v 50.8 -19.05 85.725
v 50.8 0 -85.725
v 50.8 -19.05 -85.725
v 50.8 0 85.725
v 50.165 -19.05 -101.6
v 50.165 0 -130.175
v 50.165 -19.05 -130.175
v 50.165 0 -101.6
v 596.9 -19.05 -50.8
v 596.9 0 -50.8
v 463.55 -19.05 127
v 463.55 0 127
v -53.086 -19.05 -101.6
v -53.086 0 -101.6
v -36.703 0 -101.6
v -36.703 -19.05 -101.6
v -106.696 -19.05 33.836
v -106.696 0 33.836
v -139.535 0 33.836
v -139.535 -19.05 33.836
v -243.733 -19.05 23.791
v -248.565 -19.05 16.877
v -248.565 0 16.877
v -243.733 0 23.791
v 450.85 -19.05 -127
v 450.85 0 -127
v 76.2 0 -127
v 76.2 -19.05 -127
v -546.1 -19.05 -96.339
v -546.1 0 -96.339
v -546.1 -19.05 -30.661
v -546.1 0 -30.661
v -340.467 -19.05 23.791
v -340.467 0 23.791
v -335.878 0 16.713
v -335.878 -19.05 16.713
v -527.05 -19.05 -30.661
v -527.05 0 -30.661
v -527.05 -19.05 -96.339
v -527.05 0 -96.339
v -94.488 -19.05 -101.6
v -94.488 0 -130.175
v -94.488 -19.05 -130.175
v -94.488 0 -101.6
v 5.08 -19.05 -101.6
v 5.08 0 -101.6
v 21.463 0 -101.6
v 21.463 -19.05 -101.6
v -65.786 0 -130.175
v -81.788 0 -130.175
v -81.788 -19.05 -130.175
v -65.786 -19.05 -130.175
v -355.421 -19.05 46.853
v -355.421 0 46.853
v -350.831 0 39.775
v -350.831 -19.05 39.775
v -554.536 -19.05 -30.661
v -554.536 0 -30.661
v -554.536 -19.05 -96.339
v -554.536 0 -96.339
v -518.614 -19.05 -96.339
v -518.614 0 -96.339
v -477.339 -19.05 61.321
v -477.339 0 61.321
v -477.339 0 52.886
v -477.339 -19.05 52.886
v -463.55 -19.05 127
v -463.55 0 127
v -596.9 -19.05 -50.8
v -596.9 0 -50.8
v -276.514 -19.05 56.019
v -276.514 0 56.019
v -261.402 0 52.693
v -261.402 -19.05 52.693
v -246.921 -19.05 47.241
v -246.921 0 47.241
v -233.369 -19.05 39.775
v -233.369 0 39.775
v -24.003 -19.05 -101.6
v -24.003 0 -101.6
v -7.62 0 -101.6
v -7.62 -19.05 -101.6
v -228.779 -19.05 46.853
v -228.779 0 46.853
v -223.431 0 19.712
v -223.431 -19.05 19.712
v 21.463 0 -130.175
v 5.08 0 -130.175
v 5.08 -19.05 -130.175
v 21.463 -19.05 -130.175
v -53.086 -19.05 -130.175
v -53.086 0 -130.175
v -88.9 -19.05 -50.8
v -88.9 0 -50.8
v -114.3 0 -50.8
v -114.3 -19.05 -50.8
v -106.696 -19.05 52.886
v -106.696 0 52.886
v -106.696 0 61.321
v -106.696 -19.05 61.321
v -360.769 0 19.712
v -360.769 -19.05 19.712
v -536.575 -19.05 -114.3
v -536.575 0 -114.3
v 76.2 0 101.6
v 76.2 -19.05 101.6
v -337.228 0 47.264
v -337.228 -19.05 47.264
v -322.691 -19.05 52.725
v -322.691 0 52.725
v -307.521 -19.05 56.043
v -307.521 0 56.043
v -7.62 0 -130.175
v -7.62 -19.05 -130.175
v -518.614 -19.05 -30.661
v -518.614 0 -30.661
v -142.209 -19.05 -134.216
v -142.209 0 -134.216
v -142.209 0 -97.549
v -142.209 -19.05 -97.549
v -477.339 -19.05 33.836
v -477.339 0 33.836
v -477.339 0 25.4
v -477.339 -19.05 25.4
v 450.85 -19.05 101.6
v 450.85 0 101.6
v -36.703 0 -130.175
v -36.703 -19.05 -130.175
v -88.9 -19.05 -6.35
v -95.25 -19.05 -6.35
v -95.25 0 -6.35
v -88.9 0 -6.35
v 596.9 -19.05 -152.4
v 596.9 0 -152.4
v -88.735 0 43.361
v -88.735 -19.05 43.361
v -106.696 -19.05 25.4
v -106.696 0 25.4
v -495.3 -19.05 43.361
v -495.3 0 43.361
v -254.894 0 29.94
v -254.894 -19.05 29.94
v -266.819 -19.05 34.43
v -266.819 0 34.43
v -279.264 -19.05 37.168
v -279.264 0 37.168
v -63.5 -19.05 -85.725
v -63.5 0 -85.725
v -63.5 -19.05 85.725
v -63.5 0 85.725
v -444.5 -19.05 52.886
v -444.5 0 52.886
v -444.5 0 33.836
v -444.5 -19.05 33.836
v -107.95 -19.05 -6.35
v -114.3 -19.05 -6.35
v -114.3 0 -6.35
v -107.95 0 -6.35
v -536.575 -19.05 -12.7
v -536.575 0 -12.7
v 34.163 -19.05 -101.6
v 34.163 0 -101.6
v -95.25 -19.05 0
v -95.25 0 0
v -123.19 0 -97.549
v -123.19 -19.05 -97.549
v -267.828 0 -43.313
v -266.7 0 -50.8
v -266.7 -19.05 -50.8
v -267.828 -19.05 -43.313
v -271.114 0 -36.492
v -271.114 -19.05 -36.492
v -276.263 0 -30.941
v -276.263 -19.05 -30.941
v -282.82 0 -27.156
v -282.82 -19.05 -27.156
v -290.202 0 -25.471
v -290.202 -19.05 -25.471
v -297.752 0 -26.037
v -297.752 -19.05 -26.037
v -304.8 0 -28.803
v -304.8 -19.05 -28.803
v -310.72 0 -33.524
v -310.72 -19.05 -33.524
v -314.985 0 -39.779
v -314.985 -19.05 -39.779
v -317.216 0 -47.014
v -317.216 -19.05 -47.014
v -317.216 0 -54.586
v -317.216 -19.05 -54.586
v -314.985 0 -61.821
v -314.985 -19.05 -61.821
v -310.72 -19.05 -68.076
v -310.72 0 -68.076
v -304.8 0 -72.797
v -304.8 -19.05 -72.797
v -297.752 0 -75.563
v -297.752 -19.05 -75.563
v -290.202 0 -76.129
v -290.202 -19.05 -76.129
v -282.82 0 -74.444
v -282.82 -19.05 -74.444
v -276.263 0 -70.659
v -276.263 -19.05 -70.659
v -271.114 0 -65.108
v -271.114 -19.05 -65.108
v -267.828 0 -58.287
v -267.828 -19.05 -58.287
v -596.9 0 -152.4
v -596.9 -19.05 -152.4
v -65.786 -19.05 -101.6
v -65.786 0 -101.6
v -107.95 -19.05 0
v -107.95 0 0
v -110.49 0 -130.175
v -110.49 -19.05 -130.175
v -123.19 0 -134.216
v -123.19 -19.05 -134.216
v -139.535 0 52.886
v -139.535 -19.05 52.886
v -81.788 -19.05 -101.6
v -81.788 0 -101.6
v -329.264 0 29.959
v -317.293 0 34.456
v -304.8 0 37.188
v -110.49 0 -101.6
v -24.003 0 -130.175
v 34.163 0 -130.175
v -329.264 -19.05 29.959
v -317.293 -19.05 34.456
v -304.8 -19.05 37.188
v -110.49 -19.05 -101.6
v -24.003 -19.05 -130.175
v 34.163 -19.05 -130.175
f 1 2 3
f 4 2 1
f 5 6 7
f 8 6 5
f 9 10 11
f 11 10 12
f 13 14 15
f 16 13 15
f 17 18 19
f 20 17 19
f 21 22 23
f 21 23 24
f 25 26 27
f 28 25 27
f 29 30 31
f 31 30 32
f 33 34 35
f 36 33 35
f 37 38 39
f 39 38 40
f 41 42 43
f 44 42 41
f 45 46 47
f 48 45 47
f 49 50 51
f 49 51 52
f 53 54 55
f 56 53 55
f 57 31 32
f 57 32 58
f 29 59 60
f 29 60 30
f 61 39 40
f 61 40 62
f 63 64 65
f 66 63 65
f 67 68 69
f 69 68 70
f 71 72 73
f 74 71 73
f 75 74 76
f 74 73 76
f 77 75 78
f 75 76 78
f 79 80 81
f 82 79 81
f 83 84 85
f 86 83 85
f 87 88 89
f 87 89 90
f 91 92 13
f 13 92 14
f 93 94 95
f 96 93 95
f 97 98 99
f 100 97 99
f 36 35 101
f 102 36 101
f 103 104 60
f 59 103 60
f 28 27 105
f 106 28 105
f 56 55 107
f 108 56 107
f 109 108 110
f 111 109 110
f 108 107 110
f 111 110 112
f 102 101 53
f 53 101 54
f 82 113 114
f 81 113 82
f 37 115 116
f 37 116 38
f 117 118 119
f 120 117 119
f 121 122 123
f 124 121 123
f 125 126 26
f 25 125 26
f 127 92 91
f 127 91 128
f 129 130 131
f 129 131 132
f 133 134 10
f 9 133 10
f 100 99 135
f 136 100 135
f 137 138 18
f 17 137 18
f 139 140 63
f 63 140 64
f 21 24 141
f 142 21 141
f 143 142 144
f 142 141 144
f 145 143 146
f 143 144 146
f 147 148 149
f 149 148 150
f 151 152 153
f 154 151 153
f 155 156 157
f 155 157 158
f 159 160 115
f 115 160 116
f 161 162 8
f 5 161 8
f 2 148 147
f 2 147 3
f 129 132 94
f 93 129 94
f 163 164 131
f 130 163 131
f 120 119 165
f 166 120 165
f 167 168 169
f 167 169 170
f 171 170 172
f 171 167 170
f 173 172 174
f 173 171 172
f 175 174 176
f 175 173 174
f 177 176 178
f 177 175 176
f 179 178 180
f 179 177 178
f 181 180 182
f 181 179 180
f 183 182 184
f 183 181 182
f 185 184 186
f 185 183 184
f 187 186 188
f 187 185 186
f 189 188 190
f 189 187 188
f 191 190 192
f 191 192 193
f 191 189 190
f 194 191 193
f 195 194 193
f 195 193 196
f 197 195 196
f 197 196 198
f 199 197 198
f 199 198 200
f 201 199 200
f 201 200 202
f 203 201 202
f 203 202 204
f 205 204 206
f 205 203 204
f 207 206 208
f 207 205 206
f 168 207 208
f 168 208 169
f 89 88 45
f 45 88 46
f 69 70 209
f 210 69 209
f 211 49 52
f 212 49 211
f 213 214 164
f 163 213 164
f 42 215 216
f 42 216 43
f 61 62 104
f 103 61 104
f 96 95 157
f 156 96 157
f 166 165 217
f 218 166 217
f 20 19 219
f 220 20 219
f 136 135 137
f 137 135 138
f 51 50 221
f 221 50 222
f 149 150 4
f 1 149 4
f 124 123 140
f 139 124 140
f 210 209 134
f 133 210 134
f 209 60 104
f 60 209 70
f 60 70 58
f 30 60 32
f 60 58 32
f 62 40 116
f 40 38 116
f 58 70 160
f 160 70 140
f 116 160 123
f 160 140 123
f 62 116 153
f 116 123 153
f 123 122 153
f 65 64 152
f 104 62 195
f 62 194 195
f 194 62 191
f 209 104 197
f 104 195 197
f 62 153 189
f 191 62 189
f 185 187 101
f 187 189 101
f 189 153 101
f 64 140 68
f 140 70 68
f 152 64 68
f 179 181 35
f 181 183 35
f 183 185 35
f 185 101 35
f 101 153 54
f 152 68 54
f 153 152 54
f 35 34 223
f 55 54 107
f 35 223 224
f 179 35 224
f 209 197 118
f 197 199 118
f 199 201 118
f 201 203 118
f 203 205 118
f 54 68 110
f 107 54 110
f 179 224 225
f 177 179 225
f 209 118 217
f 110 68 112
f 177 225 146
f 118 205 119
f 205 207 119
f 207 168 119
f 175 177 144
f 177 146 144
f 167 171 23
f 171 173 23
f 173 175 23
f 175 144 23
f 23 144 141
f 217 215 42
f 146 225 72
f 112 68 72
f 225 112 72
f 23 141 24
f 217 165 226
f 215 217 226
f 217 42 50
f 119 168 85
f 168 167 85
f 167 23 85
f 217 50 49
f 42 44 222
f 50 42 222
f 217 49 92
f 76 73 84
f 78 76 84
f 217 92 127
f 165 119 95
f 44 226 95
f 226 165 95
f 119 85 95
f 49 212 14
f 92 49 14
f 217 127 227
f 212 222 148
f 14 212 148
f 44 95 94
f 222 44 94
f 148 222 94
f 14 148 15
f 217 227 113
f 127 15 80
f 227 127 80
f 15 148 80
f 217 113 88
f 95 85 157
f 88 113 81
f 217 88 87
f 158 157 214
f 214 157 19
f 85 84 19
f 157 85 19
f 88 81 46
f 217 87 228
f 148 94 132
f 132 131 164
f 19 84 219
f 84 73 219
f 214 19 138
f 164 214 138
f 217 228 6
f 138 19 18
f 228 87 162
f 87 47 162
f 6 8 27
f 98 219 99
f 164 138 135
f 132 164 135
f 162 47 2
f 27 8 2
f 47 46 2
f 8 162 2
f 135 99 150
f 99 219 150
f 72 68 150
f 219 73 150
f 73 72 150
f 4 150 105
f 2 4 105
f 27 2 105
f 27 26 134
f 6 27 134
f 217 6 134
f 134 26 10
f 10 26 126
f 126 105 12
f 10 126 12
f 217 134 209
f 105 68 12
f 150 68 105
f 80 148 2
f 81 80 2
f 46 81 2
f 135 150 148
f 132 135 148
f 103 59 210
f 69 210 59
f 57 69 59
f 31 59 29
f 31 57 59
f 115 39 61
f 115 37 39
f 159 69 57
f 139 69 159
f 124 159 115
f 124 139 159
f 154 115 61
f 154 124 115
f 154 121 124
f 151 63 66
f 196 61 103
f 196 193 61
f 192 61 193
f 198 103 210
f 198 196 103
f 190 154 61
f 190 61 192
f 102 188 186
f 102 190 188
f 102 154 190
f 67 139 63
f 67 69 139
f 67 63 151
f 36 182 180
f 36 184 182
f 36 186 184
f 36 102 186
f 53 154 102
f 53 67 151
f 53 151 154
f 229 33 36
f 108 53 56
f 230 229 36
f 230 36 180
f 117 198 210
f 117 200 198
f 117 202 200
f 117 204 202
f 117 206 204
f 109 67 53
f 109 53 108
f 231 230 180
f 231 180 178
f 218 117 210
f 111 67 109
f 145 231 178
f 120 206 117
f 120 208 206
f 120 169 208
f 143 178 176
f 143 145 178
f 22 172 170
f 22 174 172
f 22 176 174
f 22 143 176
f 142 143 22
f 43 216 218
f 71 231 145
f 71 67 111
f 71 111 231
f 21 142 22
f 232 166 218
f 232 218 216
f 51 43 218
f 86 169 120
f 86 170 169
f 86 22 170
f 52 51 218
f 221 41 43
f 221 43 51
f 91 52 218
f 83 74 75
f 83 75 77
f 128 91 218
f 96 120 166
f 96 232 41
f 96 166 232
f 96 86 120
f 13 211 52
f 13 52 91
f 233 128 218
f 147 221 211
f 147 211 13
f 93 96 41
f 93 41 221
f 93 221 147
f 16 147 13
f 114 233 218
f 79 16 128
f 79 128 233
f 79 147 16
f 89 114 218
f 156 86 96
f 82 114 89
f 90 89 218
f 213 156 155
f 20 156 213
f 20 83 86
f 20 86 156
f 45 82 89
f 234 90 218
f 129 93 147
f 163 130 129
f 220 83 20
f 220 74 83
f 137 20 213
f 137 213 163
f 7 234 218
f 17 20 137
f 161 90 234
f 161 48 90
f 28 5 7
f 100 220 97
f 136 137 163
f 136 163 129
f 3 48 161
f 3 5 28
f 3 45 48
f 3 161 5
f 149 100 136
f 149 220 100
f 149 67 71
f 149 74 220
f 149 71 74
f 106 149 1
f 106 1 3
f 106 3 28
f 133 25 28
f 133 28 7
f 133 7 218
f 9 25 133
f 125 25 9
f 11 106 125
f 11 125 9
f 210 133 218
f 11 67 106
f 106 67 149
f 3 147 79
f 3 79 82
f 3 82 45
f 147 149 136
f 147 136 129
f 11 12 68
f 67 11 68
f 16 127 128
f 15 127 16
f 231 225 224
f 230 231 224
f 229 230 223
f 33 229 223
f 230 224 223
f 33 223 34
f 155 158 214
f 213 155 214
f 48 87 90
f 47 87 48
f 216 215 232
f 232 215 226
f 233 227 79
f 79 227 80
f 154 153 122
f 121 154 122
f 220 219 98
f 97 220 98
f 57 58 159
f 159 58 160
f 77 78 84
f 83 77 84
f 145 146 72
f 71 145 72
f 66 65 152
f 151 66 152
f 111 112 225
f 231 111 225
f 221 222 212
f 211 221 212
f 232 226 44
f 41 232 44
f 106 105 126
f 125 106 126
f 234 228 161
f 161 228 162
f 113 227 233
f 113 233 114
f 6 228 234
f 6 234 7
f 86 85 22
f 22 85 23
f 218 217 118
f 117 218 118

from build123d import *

# Parameters (mm, degrees)
F0_W     = 16.002
F0_H     = 28.575
F0_W_2   = 16.383
F0_R     = 25.4
F0_W_3   = 114.3
F0_H_2   = 171.45
F1_DEPTH = 19.05


with BuildPart() as f1:
    # F0 (on Front) → F1 (new body)
    with BuildSketch(Plane.XZ):
        Polygon((-596.9, -50.8), (-596.9, -127), (-596.9, -152.4), (596.9, -152.4), (596.9, -127), (596.9, -50.8), (463.55, 127), (-463.55, 127), align=None)
        Polygon((-123.19, -97.549498), (-123.19, -101.6), (-123.19, -115.8875), (-123.19, -130.175), (-123.19, -134.215891), (-142.208517, -134.215891), (-142.208517, -97.549498), align=None, mode=Mode.SUBTRACT)
        with Locations((-102.489, -115.8875)):
            Rectangle(F0_W, F0_H, mode=Mode.SUBTRACT)
        with Locations((-73.787, -115.8875)):
            Rectangle(F0_W, F0_H, mode=Mode.SUBTRACT)
        with Locations((-44.8945, -115.8875)):
            Rectangle(F0_W_2, F0_H, mode=Mode.SUBTRACT)
        with Locations((-15.8115, -115.8875)):
            Rectangle(F0_W_2, F0_H, mode=Mode.SUBTRACT)
        Polygon((-518.614488, -96.339488), (-536.575, -114.3), (-554.535512, -96.339488), (-546.1, -96.339488), (-546.1, -63.5), (-546.1, -30.660512), (-554.535512, -30.660512), (-536.575, -12.7), (-518.614488, -30.660512), (-527.05, -30.660512), (-527.05, -63.5), (-527.05, -96.339488), align=None, mode=Mode.SUBTRACT)
        with Locations((-292.1, -50.8)):
            Circle(F0_R, mode=Mode.SUBTRACT)
        Polygon((-88.9, -50.8), (-114.3, -50.8), (-114.3, -6.35), (-107.95, -6.35), (-107.95, 0), (-95.25, 0), (-95.25, -6.35), (-88.9, -6.35), align=None, mode=Mode.SUBTRACT)
        with Locations((13.2715, -115.8875)):
            Rectangle(F0_W_2, F0_H, mode=Mode.SUBTRACT)
        with Locations((42.164, -115.8875)):
            Rectangle(F0_W, F0_H, mode=Mode.SUBTRACT)
        Polygon((450.85, -127), (76.2, -127), (76.2, 101.6), (450.85, 101.6), (450.85, 0), align=None, mode=Mode.SUBTRACT)
        Polygon((-477.339488, 52.885512), (-444.5, 52.885512), (-444.5, 33.835512), (-477.339488, 33.835512), (-477.339488, 25.4), (-495.3, 43.360512), (-477.339488, 61.321024), align=None, mode=Mode.SUBTRACT)
        with BuildLine():
            ThreePointArc((-350.831293, 39.775039), (-330.058088, 50.256351), (-307.521429, 56.042791))
            Line((-307.521429, 56.042791), (-304.8, 37.188181))
            ThreePointArc((-304.8, 37.188181), (-323.359602, 32.422877), (-340.466947, 23.791209))
            Line((-340.466947, 23.791209), (-335.877518, 16.713419))
            Line((-335.877518, 16.713419), (-360.769437, 19.712333))
            Line((-360.769437, 19.712333), (-355.420722, 46.852828))
            Line((-355.420722, 46.852828), (-350.831293, 39.775039))
        make_face(mode=Mode.SUBTRACT)
        with Locations((-6.35, 0)):
            Rectangle(F0_W_3, F0_H_2, mode=Mode.SUBTRACT)
        with BuildLine():
            Line((-279.264106, 37.168459), (-276.513557, 56.018843))
            ThreePointArc((-276.513557, 56.018843), (-254.063875, 50.227005), (-233.368707, 39.775039))
            Line((-233.368707, 39.775039), (-228.779278, 46.852828))
            Line((-228.779278, 46.852828), (-223.430563, 19.712333))
            Line((-223.430563, 19.712333), (-248.564992, 16.876708))
            Line((-248.564992, 16.876708), (-243.733053, 23.791209))
            ThreePointArc((-243.733053, 23.791209), (-260.776133, 32.39871), (-279.264106, 37.168459))
        make_face(mode=Mode.SUBTRACT)
        Polygon((-139.534989, 33.835512), (-139.534989, 52.885512), (-106.695501, 52.885512), (-106.695501, 61.321024), (-88.734989, 43.360512), (-106.695501, 25.4), (-106.695501, 33.835512), align=None, mode=Mode.SUBTRACT)
    extrude(amount=F1_DEPTH)


solid = f1.part
